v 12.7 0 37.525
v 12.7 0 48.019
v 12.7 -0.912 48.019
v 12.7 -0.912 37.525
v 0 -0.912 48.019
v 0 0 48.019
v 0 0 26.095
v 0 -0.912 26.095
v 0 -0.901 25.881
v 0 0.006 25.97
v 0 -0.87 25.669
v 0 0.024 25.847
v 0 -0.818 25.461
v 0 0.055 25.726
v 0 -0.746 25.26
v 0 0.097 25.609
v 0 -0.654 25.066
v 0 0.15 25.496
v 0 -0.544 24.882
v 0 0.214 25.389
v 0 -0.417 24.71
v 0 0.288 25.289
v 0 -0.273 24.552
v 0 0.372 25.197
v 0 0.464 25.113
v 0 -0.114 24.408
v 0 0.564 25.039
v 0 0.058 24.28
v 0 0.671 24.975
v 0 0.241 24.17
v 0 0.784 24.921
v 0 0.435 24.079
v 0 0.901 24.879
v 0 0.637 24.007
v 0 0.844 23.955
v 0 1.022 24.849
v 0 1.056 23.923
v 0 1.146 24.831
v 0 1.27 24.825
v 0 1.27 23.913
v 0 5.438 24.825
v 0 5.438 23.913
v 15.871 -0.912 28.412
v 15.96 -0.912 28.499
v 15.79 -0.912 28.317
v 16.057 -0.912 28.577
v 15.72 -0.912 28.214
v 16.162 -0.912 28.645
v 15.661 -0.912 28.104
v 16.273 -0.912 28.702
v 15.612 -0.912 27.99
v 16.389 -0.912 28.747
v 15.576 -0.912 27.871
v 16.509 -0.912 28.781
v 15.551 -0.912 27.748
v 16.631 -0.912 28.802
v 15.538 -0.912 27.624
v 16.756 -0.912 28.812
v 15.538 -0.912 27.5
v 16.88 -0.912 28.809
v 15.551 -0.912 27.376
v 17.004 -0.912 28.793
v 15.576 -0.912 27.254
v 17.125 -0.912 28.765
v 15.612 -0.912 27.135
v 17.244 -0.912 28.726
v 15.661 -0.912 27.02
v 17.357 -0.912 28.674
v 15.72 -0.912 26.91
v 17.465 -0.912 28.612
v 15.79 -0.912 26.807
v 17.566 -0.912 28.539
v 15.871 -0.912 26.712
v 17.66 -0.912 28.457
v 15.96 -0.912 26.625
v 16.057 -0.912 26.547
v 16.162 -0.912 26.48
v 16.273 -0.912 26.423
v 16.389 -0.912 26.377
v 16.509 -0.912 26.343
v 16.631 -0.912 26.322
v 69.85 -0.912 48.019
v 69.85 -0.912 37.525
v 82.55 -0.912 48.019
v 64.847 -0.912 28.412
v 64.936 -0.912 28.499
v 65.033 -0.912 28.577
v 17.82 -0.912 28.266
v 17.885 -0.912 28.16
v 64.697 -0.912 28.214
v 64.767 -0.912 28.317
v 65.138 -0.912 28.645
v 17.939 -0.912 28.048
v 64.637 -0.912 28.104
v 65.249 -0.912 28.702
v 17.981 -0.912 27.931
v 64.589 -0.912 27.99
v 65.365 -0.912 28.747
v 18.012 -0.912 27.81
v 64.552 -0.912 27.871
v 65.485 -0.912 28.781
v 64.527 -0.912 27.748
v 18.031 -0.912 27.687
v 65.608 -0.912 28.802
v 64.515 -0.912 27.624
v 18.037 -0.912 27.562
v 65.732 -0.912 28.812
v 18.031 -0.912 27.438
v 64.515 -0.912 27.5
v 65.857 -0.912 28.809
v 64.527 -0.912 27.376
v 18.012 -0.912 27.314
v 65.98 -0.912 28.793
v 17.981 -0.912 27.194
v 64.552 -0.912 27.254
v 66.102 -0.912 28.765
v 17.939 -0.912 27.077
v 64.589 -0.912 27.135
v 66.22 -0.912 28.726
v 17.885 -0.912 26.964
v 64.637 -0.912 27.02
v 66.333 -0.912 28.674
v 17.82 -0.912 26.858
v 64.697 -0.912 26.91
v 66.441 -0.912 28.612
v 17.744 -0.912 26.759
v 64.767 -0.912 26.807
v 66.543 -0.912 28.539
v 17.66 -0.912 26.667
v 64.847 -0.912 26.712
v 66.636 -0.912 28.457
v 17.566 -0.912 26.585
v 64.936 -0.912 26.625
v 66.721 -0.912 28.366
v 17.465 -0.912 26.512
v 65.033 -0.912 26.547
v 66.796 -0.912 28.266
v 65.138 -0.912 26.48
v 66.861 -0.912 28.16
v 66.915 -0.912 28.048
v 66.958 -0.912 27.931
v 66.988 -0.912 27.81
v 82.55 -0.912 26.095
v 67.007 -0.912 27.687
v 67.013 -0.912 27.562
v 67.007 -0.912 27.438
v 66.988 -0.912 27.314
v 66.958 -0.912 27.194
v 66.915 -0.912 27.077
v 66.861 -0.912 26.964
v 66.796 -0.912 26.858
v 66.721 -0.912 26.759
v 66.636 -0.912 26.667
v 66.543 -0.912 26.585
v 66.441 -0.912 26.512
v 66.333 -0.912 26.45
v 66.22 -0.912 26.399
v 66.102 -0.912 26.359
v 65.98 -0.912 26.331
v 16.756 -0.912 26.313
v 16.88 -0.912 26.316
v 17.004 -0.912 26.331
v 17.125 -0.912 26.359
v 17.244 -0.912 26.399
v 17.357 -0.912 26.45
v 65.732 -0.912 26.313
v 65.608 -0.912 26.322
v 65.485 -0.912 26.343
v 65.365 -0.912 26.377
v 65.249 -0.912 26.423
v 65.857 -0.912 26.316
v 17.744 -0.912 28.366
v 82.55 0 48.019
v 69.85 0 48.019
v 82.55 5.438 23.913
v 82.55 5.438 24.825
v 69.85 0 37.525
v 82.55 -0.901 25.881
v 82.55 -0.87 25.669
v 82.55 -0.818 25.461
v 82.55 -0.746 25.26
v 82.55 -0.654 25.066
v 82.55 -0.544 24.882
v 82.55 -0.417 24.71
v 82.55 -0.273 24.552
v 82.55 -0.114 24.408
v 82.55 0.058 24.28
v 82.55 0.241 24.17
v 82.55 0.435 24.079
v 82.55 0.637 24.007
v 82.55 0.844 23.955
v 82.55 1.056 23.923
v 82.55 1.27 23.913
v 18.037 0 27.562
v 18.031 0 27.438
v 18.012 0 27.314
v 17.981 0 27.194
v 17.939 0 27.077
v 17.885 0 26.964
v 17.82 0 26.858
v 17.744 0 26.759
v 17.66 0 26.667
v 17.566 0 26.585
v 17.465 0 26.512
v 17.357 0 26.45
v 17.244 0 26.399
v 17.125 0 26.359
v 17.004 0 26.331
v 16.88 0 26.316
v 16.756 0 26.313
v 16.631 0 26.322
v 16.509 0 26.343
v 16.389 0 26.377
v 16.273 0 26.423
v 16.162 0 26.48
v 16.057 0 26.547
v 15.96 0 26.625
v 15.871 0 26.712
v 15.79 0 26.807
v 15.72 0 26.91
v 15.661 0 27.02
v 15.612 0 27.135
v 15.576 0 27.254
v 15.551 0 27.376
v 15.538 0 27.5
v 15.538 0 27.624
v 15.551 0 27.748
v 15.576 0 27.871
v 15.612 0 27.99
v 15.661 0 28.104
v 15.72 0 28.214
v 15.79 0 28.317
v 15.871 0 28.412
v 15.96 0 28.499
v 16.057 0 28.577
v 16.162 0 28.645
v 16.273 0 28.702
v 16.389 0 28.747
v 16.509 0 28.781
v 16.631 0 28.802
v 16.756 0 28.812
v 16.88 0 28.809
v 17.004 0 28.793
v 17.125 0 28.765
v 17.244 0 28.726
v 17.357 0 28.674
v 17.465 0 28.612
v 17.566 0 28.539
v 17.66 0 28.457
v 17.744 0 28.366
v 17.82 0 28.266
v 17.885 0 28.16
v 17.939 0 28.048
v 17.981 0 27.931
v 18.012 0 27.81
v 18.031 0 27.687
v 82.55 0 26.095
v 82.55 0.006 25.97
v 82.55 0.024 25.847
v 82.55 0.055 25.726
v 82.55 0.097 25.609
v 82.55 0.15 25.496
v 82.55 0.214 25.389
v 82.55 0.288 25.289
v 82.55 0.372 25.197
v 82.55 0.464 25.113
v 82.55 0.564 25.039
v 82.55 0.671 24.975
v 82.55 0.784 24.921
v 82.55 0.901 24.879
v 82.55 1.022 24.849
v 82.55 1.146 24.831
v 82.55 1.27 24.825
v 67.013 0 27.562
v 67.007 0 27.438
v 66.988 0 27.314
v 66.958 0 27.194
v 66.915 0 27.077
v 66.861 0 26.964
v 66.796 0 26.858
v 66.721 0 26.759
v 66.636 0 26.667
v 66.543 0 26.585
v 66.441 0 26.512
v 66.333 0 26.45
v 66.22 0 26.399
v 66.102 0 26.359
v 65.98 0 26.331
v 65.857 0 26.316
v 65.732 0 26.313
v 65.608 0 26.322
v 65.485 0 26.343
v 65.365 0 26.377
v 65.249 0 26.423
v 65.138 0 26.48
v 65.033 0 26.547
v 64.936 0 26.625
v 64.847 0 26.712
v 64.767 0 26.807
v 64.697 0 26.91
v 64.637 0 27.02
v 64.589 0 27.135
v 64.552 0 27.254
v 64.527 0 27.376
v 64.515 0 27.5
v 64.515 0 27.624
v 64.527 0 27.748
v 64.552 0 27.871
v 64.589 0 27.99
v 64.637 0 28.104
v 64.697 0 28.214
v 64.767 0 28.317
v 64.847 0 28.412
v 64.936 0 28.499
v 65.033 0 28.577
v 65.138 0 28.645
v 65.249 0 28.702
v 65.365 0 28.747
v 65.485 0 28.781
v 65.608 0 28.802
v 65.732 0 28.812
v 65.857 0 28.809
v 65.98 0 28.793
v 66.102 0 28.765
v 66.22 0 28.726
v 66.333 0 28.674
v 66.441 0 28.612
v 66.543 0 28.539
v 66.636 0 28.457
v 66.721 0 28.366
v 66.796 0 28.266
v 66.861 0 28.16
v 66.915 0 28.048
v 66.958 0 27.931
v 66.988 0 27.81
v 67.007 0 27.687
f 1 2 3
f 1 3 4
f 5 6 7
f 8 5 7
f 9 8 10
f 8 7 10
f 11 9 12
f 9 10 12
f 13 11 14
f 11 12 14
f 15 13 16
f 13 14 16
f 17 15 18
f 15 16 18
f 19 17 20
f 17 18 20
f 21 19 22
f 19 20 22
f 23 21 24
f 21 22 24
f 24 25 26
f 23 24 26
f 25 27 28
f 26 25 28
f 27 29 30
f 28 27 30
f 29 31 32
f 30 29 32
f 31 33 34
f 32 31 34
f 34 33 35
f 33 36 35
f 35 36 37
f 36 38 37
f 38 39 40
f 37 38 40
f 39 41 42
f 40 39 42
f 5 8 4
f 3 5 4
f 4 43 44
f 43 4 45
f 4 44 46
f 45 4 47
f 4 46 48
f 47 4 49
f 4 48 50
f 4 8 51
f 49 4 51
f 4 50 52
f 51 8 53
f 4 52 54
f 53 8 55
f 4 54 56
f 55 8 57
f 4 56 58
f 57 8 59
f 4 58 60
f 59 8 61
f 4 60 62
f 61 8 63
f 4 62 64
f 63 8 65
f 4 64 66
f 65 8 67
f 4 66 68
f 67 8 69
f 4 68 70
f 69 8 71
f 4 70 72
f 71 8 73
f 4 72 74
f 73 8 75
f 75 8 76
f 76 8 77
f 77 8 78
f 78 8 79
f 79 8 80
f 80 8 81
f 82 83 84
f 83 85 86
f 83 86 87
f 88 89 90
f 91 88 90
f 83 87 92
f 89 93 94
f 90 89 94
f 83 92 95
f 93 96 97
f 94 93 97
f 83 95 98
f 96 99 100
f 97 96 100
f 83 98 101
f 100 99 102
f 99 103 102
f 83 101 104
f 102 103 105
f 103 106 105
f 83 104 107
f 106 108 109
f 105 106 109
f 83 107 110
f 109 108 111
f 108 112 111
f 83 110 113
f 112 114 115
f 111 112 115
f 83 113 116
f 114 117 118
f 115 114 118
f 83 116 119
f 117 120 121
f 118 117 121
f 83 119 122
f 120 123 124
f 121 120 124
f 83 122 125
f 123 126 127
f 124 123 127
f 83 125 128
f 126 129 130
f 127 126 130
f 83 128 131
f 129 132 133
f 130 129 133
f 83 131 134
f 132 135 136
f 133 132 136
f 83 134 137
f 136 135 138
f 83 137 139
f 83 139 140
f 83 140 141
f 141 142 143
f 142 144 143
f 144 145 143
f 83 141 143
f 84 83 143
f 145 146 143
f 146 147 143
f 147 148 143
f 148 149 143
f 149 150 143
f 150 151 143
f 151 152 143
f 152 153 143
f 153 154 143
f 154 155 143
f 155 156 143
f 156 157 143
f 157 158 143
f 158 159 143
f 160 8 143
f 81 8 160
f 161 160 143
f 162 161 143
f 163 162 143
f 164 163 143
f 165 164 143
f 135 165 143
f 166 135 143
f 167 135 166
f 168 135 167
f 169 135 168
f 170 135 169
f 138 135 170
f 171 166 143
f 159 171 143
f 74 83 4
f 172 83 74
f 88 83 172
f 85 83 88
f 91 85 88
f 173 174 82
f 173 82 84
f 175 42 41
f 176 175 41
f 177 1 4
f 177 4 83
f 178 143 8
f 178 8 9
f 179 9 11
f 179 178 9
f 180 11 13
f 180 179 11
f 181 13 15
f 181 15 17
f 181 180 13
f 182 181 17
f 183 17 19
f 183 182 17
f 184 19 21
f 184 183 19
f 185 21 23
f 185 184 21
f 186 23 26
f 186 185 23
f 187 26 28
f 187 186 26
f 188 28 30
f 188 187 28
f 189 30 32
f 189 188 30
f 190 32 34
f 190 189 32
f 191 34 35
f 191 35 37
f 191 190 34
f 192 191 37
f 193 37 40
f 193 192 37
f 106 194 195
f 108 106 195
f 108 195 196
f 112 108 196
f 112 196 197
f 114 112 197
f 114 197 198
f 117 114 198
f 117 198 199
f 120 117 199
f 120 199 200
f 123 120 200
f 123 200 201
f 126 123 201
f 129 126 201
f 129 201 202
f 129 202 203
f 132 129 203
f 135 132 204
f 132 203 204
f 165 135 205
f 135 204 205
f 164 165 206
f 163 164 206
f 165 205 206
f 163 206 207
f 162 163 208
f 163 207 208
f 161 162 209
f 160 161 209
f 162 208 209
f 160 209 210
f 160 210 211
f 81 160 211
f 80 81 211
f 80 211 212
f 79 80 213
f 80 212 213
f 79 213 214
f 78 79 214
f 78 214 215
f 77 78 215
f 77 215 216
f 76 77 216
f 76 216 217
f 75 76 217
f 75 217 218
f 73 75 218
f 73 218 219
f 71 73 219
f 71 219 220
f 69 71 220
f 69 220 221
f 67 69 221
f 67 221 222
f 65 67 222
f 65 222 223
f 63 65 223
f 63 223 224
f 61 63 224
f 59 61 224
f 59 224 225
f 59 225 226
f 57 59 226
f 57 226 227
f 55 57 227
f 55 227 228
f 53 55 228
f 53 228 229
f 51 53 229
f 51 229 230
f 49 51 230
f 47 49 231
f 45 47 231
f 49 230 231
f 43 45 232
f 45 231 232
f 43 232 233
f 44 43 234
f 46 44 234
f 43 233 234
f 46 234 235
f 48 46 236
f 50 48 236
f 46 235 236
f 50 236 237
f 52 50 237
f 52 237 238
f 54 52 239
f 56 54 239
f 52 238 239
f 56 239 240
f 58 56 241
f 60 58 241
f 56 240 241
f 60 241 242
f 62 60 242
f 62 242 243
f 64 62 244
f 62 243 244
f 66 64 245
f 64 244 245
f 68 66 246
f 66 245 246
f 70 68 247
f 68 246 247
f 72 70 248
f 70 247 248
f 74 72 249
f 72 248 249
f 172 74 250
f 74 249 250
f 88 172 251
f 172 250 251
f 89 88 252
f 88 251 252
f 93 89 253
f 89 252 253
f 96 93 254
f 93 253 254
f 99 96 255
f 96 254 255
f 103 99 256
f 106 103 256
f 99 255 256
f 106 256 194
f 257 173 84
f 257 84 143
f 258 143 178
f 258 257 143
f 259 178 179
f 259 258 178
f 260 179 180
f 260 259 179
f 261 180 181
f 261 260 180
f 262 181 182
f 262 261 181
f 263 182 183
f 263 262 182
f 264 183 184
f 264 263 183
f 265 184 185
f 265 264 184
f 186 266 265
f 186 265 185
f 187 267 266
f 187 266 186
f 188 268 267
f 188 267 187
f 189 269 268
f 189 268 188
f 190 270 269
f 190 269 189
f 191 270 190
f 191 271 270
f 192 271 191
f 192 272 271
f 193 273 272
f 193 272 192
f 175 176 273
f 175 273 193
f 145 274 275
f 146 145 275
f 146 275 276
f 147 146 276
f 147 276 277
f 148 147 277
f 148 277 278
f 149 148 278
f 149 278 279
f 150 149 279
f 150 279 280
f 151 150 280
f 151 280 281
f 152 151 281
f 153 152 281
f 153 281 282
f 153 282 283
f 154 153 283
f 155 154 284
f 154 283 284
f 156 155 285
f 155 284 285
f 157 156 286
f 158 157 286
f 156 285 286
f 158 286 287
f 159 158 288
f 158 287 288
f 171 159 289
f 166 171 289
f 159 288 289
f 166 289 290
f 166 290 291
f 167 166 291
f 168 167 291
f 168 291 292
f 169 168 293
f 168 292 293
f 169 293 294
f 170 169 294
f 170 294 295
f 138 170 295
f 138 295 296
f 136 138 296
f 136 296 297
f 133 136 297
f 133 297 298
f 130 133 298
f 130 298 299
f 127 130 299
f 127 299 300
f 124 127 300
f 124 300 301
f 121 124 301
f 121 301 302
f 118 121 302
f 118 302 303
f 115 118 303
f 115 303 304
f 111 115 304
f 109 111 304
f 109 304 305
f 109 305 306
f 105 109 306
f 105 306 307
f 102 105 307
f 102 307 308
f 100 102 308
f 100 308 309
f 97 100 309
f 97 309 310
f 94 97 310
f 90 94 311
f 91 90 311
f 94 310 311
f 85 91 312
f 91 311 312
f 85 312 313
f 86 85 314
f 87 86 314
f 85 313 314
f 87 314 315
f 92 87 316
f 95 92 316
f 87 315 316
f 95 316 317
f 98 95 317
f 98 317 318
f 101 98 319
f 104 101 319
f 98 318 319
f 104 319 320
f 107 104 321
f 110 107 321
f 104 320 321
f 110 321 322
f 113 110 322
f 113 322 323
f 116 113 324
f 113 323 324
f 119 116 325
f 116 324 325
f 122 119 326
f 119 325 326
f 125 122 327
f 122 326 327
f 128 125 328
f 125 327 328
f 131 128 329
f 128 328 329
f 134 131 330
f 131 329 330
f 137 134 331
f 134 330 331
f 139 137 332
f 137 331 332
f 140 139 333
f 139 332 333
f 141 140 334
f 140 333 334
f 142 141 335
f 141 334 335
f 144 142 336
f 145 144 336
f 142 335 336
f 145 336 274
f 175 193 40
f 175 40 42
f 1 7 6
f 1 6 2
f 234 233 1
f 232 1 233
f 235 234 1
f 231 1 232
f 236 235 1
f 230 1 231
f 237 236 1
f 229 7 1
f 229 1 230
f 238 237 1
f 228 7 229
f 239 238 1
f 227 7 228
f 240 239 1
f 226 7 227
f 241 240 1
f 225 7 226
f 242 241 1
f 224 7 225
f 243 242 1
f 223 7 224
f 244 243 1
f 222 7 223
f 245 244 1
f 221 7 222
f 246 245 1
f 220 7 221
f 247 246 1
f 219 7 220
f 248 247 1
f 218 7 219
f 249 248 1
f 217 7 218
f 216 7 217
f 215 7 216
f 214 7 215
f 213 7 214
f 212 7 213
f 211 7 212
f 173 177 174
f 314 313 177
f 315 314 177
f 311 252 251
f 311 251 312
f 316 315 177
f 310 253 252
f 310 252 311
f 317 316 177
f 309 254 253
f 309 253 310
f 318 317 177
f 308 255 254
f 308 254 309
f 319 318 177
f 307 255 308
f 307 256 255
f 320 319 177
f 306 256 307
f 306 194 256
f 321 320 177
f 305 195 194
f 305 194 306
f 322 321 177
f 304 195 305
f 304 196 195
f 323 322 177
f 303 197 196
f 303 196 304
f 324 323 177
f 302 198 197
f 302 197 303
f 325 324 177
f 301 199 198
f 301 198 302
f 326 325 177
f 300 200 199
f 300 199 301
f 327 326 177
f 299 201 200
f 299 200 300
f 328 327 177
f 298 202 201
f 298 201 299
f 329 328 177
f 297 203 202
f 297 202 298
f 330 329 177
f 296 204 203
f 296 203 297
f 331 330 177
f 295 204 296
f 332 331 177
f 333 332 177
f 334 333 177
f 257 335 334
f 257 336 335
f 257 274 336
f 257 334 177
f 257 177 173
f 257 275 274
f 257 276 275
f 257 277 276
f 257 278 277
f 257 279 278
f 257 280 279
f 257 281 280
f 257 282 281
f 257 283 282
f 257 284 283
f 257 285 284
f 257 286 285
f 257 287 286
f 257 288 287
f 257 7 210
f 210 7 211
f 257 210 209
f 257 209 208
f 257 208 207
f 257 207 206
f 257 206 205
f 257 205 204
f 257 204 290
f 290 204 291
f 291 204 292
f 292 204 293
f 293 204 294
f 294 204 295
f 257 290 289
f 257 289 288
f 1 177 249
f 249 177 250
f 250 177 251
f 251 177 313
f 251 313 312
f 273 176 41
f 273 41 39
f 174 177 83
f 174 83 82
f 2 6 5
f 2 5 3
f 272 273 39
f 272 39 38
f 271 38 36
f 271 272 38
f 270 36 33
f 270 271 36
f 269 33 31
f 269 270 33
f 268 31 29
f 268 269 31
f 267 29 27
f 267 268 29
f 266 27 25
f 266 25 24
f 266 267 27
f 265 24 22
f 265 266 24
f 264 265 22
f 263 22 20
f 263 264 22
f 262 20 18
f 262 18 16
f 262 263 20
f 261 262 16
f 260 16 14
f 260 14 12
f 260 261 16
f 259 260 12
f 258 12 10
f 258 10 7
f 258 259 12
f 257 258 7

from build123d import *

# Parameters (mm, degrees)
BASE_FLANGE1_DEPTH           = 0.91186
F_2_5MM_DOWEL_HOLE1_D        = 2.5
EDGE_FLANGE1_STRIP_W         = 6.18744
EDGE_FLANGE1_STRIP_H         = 0.91186
EDGE_FLANGE1_STRIP_CUT_DEPTH = 82.55
EDGE_FLANGE1_DEPTH           = 82.55


# Sheet-metal steps are written as plain solids
with BuildPart() as part:
    # Sketch1 → Base-Flange1 (new body)
    with BuildSketch(Plane(origin=(0, 0, 0), x_dir=(1, 0, 0), z_dir=(0, 1, 0))):
        Polygon((0, -24.82463), (0, -48.018817445), (12.7, -48.018817445), (12.7, -37.52463), (69.85, -37.52463), (69.85, -48.018817445), (82.55, -48.018817445), (82.55, -24.82463), align=None)
    extrude(amount=-BASE_FLANGE1_DEPTH)

    # Ø2.5mm Dowel Hole1 (through all)
    with Locations(Plane(origin=(0, -0.91186, 0), x_dir=(-1, 0, 0), z_dir=(0, -1, 0))):
        with Locations((-65.76314, -27.56213), (-16.78686, -27.56213)):
            Hole(F_2_5MM_DOWEL_HOLE1_D / 2)

    # Edge-Flange1 strip (across the edge) → Edge-Flange1 strip cut (cut)
    with BuildSketch(Plane(origin=(82.55, 0, 24.82463), x_dir=(0, 0, 1), z_dir=(-1, 0, 0))):
        with Locations((-1.82372, -0.45593)):
            Rectangle(EDGE_FLANGE1_STRIP_W, EDGE_FLANGE1_STRIP_H)
    extrude(amount=EDGE_FLANGE1_STRIP_CUT_DEPTH, mode=Mode.SUBTRACT)

    # Edge-Flange1 section (across the edge) → Edge-Flange1 (add)
    with BuildSketch(Plane(origin=(82.55, 0, 24.82463), x_dir=(0, 0, 1), z_dir=(-1, 0, 0))):
        with BuildLine():
            Line((-0.91186, 1.27), (-0.91186, 5.43814))
            Line((-0.91186, 5.43814), (0, 5.43814))
            Line((0, 5.43814), (0, 1.27))
            ThreePointArc((0, 1.27), (0.371974388, 0.371974388), (1.27, 0))
            Line((1.27, 0), (1.27, -0.91186))
            ThreePointArc((1.27, -0.91186), (-0.272808002, -0.272808002), (-0.91186, 1.27))
        make_face()
    extrude(amount=EDGE_FLANGE1_DEPTH)


solid = part.part
